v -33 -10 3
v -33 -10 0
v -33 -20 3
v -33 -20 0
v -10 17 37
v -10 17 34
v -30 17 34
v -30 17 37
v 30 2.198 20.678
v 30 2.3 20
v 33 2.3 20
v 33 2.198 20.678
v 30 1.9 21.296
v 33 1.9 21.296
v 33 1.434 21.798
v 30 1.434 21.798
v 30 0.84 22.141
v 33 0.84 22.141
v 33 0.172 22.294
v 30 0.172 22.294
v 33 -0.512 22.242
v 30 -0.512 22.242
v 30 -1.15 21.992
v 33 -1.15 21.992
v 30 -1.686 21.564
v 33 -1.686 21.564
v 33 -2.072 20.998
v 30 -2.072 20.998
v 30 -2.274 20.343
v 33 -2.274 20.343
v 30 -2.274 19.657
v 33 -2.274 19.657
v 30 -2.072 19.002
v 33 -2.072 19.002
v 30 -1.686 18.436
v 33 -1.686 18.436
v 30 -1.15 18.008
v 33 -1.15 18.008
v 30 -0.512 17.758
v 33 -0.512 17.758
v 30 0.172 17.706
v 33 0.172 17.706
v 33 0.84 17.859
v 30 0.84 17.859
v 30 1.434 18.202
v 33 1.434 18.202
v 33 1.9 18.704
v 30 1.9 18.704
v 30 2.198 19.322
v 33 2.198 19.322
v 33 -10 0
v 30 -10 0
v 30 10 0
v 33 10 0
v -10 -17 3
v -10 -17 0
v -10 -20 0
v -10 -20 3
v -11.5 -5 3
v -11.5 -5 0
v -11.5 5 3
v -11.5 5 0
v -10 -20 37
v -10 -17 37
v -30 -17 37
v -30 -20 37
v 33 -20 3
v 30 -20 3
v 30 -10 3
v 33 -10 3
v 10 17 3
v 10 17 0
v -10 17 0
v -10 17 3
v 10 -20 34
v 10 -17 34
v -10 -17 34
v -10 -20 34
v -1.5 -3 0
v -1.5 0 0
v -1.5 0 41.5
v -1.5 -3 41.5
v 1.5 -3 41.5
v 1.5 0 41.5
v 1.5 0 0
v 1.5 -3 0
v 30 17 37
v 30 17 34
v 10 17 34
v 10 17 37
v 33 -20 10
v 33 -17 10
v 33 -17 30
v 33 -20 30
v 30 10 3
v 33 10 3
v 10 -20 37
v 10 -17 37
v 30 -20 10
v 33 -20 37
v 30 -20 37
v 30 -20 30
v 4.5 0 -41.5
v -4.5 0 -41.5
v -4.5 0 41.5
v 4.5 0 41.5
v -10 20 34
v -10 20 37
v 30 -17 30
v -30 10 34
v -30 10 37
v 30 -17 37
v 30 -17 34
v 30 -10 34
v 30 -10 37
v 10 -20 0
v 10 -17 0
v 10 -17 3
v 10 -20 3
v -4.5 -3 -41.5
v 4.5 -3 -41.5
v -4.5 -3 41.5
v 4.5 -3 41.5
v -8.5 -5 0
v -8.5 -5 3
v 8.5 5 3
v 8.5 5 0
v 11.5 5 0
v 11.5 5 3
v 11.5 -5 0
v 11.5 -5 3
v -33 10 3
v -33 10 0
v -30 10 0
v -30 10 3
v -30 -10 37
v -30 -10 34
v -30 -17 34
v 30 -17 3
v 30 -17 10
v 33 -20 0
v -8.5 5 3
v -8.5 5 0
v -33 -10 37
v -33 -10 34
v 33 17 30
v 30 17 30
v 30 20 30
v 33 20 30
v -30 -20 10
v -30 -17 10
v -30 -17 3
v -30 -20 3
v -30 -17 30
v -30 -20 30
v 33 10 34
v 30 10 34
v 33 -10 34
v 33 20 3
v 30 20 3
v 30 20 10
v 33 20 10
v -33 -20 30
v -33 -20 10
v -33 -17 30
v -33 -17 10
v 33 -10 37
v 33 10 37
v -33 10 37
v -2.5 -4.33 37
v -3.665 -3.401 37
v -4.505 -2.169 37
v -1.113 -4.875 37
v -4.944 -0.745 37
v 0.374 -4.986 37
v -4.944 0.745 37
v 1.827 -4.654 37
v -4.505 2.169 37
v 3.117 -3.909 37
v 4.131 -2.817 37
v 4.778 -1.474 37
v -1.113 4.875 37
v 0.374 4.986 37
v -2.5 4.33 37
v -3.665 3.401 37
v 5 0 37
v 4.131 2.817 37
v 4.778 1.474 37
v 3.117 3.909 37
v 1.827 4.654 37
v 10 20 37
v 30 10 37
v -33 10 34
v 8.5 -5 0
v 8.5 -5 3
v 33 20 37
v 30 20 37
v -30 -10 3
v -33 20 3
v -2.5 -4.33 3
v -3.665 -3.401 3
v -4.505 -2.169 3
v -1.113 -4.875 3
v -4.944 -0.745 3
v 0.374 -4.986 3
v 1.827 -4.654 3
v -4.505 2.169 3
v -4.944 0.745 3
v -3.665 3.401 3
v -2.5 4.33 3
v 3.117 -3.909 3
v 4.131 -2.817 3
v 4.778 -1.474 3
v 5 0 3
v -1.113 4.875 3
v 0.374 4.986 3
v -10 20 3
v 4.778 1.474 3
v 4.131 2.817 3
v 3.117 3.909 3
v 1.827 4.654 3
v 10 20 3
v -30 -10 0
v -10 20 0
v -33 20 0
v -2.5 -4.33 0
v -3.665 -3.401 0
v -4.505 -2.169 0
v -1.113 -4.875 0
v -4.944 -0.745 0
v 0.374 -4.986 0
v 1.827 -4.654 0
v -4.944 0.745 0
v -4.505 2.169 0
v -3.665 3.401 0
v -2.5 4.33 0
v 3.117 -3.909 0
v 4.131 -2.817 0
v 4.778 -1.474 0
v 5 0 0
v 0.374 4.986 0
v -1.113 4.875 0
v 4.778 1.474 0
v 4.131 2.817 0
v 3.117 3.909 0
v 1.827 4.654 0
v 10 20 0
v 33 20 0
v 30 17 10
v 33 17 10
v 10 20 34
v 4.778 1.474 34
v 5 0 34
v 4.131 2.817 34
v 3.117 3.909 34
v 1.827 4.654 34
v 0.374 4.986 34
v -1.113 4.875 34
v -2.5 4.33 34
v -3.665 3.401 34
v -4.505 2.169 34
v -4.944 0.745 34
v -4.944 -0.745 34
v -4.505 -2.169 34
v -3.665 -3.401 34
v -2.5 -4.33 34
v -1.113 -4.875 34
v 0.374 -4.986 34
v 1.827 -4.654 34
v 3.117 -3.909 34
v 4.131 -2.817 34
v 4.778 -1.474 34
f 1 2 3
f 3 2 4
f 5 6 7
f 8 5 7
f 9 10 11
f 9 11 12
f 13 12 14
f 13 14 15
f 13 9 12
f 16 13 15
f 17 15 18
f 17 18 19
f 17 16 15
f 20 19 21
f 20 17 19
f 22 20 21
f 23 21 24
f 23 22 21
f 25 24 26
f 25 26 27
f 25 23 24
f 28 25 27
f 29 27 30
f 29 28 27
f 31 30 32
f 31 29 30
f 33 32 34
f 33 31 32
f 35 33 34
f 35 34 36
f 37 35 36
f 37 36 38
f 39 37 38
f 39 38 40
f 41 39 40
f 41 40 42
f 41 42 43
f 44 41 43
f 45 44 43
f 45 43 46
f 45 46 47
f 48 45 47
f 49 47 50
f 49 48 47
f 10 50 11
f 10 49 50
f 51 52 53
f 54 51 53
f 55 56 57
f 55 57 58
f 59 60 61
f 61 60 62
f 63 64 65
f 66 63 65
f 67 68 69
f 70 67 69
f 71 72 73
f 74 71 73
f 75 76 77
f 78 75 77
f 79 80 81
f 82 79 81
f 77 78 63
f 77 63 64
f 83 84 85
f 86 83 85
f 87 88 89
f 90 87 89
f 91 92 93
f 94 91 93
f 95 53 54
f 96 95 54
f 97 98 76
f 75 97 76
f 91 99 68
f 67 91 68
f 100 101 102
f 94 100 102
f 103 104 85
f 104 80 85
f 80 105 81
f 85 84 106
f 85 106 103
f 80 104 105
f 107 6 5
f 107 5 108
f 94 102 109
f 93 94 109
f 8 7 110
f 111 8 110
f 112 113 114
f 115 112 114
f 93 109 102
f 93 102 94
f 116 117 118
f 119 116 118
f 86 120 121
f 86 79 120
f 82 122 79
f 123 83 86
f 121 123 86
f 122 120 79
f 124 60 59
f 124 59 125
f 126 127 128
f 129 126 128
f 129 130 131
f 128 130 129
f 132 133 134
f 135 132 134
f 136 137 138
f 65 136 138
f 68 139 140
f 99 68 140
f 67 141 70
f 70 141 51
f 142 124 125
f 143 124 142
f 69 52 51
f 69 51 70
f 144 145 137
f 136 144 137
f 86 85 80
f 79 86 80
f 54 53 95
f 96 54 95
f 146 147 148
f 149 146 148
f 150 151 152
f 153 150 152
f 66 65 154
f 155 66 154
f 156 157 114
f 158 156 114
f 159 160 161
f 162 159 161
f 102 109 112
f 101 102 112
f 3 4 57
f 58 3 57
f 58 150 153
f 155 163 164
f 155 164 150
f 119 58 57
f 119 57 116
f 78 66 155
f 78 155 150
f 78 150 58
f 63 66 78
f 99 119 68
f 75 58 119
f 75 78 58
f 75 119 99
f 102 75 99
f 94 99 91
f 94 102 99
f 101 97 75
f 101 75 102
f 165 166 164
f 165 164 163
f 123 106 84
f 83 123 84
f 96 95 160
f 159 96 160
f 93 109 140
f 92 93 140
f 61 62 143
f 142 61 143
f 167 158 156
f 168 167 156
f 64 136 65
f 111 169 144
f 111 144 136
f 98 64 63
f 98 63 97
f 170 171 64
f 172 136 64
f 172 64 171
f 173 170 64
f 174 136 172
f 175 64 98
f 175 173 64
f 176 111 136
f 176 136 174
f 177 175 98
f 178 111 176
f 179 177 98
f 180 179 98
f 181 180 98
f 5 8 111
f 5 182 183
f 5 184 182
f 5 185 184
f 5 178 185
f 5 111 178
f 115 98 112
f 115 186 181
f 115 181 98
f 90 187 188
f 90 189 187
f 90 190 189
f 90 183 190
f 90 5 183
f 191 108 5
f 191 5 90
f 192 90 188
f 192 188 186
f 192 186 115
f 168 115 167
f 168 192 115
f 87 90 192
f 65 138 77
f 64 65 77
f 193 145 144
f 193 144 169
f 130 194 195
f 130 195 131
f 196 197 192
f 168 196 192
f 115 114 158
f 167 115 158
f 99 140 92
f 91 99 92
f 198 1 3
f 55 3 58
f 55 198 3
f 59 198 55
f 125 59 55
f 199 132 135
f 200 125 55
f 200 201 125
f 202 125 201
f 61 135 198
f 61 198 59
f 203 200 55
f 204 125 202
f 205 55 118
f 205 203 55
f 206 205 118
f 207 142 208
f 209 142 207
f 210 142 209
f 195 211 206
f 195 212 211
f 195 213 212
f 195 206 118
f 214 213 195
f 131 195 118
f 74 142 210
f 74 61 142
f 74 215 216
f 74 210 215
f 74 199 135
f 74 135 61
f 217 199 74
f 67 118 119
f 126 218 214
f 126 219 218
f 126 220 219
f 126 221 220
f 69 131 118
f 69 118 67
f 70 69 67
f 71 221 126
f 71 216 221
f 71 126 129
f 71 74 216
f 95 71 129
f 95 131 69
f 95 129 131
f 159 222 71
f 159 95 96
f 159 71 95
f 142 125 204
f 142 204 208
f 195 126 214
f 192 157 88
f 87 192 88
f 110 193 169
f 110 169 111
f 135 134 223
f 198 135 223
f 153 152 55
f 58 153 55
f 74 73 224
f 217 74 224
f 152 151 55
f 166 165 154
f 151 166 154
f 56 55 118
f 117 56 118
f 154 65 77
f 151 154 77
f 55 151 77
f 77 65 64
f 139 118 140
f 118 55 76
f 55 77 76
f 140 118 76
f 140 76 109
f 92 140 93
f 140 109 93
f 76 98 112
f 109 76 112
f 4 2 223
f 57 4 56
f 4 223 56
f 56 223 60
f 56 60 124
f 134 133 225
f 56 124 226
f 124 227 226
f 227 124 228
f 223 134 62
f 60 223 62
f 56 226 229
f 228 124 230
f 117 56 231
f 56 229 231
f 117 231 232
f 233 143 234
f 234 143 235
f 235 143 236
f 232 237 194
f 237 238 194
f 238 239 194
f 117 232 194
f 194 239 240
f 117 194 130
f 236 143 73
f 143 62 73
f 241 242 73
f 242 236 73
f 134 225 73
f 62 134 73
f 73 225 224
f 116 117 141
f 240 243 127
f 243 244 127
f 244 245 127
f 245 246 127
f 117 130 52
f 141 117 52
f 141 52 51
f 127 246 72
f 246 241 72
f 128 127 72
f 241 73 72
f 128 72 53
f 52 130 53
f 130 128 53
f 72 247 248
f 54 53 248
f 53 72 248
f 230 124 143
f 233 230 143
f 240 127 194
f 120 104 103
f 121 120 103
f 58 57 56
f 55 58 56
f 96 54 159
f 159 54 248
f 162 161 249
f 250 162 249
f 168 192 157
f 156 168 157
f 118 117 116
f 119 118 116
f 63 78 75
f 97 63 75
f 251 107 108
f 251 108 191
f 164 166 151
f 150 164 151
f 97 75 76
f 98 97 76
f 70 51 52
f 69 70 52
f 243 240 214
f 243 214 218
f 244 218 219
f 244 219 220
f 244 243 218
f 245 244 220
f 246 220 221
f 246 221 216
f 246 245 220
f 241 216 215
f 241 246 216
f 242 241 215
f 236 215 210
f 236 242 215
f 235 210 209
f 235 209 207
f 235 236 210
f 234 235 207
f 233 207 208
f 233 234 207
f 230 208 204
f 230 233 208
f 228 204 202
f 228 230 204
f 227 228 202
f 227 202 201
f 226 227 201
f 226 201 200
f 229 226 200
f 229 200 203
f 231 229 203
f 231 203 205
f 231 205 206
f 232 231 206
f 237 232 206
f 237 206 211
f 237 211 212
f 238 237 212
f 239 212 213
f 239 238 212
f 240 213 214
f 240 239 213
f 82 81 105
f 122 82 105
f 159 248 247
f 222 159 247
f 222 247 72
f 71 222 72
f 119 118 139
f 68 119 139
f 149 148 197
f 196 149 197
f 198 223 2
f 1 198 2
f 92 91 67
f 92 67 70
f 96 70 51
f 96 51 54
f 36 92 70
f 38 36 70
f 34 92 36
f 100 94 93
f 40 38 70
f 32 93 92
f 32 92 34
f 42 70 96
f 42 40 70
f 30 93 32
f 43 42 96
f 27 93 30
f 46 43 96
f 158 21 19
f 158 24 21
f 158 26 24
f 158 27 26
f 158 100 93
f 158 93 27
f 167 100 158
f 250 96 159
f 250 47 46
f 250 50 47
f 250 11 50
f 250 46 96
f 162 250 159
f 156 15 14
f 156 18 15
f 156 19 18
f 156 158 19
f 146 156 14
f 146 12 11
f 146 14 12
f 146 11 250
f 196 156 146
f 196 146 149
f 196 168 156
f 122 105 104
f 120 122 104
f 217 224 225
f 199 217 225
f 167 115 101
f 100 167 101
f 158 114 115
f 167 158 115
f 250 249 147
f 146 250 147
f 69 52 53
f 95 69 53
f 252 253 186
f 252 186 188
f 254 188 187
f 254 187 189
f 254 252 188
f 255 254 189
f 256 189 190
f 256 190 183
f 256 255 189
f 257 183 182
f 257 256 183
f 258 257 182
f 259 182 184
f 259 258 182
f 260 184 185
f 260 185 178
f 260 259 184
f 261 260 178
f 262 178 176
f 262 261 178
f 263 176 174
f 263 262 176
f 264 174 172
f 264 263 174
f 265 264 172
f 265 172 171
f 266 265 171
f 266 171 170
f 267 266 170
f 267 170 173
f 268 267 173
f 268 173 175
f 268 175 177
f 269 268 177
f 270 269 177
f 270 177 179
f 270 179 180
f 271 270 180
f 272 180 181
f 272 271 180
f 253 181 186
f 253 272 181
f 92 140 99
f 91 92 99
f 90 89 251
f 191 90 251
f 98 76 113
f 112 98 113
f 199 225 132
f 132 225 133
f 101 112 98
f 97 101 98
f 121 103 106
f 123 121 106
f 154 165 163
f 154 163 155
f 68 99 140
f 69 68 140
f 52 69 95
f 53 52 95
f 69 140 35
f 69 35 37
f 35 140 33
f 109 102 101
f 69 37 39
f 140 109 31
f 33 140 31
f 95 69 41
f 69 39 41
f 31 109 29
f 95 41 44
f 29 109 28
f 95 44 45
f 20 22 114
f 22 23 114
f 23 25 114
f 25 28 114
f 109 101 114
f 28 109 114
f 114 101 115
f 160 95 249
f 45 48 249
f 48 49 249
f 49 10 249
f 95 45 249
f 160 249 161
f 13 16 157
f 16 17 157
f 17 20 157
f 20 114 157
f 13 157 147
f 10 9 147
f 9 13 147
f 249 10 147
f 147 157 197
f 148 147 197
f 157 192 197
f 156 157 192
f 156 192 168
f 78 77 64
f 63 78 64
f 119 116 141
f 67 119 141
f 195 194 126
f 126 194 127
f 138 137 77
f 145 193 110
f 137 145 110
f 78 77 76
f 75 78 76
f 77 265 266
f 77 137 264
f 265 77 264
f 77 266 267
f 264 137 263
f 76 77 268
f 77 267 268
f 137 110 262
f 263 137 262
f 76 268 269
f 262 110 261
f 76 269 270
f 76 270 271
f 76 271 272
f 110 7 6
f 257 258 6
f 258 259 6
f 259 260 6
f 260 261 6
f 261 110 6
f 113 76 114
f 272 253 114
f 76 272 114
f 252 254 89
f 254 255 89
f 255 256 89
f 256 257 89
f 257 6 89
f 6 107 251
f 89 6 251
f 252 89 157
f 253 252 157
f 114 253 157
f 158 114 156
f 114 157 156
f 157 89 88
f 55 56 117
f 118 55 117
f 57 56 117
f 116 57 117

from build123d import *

# Parameters (mm, degrees)
F0_W     = 3
F0_H     = 10
F0_R     = 5
F1_DEPTH = 3
F2_R     = 2.3
F2_W     = 20
F2_H     = 3
F3_DEPTH = 3
F5_DEPTH = 3
F6_R     = 5
F6_W     = 20
F6_H     = 3
F6_W_2   = 3
F6_H_2   = 20
F7_DEPTH = 3
F8_W     = 3
F8_H     = 20
F8_W_2   = 20
F8_H_2   = 3
F9_DEPTH = 3


with BuildPart() as f1:
    # F0 (on Top) → F1 (new body)
    with BuildSketch(Plane.XY):
        Polygon((33, 10), (33, 20), (10, 20), (10, 17), (-10, 17), (-10, 20), (-33, 20), (-33, 10), (-30, 10), (-30, -10), (-33, -10), (-33, -20), (-10, -20), (-10, -17), (10, -17), (10, -20), (33, -20), (33, -10), (30, -10), (30, 10), align=None)
        with Locations((-10, 0)):
            Rectangle(F0_W, F0_H, mode=Mode.SUBTRACT)
        Circle(F0_R, mode=Mode.SUBTRACT)
        with Locations((10, 0)):
            Rectangle(F0_W, F0_H, mode=Mode.SUBTRACT)
    extrude(amount=F1_DEPTH)


with BuildPart() as f3:
    # F2 (on face) → F3 (new body)
    with BuildSketch(Plane.YZ.offset(30)):
        Polygon((-20, 10), (-20, 3), (-10, 3), (10, 3), (20, 3), (20, 10), (17, 10), (17, 30), (20, 30), (20, 37), (10, 37), (10, 34), (-10, 34), (-10, 37), (-20, 37), (-20, 30), (-17, 30), (-17, 10), align=None)
        with Locations((0, 20)):
            Circle(F2_R, mode=Mode.SUBTRACT)
        with Locations((0, 1.5)):
            Rectangle(F2_W, F2_H)
    extrude(amount=F3_DEPTH)


with BuildPart() as f5:
    # F4 (on Front) → F5 (new body)
    with BuildSketch(Plane.XZ):
        Polygon((4.5, -41.5), (4.5, 41.5), (1.5, 41.5), (1.5, 0), (-1.5, 0), (-1.5, 41.5), (-4.5, 41.5), (-4.5, -41.5), align=None)
    extrude(amount=F5_DEPTH)


with BuildPart() as f7:
    # F6 (on face) → F7 (new body)
    with BuildSketch(Plane.XY.offset(34)):
        Polygon((-30, -10), (-30, -17), (-10, -17), (10, -17), (30, -17), (30, -10), (30, 10), (30, 17), (10, 17), (-10, 17), (-30, 17), (-30, 10), align=None)
        Circle(F6_R, mode=Mode.SUBTRACT)
        with Locations((0, -18.5)):
            Rectangle(F6_W, F6_H)
        with Locations((-31.5, 0)):
            Rectangle(F6_W_2, F6_H_2)
        with Locations((31.5, 0)):
            Rectangle(F6_W_2, F6_H_2)
        with Locations((0, 18.5)):
            Rectangle(F6_W, F6_H)
    extrude(amount=F7_DEPTH)


with BuildPart() as f9:
    # F8 (on face) → F9 (new body)
    with BuildSketch(Plane.XZ.offset(17)):
        Polygon((-30, 10), (-30, 3), (-10, 3), (10, 3), (30, 3), (30, 10), (30, 30), (30, 37), (10, 37), (10, 34), (-10, 34), (-10, 37), (-30, 37), (-30, 30), align=None)
        with Locations((-31.5, 20)):
            Rectangle(F8_W, F8_H)
        with Locations((0, 1.5)):
            Rectangle(F8_W_2, F8_H_2)
        with Locations((31.5, 20)):
            Rectangle(F8_W, F8_H)
    extrude(amount=F9_DEPTH)


solid = Compound([f1.part, f3.part, f5.part, f7.part, f9.part])
